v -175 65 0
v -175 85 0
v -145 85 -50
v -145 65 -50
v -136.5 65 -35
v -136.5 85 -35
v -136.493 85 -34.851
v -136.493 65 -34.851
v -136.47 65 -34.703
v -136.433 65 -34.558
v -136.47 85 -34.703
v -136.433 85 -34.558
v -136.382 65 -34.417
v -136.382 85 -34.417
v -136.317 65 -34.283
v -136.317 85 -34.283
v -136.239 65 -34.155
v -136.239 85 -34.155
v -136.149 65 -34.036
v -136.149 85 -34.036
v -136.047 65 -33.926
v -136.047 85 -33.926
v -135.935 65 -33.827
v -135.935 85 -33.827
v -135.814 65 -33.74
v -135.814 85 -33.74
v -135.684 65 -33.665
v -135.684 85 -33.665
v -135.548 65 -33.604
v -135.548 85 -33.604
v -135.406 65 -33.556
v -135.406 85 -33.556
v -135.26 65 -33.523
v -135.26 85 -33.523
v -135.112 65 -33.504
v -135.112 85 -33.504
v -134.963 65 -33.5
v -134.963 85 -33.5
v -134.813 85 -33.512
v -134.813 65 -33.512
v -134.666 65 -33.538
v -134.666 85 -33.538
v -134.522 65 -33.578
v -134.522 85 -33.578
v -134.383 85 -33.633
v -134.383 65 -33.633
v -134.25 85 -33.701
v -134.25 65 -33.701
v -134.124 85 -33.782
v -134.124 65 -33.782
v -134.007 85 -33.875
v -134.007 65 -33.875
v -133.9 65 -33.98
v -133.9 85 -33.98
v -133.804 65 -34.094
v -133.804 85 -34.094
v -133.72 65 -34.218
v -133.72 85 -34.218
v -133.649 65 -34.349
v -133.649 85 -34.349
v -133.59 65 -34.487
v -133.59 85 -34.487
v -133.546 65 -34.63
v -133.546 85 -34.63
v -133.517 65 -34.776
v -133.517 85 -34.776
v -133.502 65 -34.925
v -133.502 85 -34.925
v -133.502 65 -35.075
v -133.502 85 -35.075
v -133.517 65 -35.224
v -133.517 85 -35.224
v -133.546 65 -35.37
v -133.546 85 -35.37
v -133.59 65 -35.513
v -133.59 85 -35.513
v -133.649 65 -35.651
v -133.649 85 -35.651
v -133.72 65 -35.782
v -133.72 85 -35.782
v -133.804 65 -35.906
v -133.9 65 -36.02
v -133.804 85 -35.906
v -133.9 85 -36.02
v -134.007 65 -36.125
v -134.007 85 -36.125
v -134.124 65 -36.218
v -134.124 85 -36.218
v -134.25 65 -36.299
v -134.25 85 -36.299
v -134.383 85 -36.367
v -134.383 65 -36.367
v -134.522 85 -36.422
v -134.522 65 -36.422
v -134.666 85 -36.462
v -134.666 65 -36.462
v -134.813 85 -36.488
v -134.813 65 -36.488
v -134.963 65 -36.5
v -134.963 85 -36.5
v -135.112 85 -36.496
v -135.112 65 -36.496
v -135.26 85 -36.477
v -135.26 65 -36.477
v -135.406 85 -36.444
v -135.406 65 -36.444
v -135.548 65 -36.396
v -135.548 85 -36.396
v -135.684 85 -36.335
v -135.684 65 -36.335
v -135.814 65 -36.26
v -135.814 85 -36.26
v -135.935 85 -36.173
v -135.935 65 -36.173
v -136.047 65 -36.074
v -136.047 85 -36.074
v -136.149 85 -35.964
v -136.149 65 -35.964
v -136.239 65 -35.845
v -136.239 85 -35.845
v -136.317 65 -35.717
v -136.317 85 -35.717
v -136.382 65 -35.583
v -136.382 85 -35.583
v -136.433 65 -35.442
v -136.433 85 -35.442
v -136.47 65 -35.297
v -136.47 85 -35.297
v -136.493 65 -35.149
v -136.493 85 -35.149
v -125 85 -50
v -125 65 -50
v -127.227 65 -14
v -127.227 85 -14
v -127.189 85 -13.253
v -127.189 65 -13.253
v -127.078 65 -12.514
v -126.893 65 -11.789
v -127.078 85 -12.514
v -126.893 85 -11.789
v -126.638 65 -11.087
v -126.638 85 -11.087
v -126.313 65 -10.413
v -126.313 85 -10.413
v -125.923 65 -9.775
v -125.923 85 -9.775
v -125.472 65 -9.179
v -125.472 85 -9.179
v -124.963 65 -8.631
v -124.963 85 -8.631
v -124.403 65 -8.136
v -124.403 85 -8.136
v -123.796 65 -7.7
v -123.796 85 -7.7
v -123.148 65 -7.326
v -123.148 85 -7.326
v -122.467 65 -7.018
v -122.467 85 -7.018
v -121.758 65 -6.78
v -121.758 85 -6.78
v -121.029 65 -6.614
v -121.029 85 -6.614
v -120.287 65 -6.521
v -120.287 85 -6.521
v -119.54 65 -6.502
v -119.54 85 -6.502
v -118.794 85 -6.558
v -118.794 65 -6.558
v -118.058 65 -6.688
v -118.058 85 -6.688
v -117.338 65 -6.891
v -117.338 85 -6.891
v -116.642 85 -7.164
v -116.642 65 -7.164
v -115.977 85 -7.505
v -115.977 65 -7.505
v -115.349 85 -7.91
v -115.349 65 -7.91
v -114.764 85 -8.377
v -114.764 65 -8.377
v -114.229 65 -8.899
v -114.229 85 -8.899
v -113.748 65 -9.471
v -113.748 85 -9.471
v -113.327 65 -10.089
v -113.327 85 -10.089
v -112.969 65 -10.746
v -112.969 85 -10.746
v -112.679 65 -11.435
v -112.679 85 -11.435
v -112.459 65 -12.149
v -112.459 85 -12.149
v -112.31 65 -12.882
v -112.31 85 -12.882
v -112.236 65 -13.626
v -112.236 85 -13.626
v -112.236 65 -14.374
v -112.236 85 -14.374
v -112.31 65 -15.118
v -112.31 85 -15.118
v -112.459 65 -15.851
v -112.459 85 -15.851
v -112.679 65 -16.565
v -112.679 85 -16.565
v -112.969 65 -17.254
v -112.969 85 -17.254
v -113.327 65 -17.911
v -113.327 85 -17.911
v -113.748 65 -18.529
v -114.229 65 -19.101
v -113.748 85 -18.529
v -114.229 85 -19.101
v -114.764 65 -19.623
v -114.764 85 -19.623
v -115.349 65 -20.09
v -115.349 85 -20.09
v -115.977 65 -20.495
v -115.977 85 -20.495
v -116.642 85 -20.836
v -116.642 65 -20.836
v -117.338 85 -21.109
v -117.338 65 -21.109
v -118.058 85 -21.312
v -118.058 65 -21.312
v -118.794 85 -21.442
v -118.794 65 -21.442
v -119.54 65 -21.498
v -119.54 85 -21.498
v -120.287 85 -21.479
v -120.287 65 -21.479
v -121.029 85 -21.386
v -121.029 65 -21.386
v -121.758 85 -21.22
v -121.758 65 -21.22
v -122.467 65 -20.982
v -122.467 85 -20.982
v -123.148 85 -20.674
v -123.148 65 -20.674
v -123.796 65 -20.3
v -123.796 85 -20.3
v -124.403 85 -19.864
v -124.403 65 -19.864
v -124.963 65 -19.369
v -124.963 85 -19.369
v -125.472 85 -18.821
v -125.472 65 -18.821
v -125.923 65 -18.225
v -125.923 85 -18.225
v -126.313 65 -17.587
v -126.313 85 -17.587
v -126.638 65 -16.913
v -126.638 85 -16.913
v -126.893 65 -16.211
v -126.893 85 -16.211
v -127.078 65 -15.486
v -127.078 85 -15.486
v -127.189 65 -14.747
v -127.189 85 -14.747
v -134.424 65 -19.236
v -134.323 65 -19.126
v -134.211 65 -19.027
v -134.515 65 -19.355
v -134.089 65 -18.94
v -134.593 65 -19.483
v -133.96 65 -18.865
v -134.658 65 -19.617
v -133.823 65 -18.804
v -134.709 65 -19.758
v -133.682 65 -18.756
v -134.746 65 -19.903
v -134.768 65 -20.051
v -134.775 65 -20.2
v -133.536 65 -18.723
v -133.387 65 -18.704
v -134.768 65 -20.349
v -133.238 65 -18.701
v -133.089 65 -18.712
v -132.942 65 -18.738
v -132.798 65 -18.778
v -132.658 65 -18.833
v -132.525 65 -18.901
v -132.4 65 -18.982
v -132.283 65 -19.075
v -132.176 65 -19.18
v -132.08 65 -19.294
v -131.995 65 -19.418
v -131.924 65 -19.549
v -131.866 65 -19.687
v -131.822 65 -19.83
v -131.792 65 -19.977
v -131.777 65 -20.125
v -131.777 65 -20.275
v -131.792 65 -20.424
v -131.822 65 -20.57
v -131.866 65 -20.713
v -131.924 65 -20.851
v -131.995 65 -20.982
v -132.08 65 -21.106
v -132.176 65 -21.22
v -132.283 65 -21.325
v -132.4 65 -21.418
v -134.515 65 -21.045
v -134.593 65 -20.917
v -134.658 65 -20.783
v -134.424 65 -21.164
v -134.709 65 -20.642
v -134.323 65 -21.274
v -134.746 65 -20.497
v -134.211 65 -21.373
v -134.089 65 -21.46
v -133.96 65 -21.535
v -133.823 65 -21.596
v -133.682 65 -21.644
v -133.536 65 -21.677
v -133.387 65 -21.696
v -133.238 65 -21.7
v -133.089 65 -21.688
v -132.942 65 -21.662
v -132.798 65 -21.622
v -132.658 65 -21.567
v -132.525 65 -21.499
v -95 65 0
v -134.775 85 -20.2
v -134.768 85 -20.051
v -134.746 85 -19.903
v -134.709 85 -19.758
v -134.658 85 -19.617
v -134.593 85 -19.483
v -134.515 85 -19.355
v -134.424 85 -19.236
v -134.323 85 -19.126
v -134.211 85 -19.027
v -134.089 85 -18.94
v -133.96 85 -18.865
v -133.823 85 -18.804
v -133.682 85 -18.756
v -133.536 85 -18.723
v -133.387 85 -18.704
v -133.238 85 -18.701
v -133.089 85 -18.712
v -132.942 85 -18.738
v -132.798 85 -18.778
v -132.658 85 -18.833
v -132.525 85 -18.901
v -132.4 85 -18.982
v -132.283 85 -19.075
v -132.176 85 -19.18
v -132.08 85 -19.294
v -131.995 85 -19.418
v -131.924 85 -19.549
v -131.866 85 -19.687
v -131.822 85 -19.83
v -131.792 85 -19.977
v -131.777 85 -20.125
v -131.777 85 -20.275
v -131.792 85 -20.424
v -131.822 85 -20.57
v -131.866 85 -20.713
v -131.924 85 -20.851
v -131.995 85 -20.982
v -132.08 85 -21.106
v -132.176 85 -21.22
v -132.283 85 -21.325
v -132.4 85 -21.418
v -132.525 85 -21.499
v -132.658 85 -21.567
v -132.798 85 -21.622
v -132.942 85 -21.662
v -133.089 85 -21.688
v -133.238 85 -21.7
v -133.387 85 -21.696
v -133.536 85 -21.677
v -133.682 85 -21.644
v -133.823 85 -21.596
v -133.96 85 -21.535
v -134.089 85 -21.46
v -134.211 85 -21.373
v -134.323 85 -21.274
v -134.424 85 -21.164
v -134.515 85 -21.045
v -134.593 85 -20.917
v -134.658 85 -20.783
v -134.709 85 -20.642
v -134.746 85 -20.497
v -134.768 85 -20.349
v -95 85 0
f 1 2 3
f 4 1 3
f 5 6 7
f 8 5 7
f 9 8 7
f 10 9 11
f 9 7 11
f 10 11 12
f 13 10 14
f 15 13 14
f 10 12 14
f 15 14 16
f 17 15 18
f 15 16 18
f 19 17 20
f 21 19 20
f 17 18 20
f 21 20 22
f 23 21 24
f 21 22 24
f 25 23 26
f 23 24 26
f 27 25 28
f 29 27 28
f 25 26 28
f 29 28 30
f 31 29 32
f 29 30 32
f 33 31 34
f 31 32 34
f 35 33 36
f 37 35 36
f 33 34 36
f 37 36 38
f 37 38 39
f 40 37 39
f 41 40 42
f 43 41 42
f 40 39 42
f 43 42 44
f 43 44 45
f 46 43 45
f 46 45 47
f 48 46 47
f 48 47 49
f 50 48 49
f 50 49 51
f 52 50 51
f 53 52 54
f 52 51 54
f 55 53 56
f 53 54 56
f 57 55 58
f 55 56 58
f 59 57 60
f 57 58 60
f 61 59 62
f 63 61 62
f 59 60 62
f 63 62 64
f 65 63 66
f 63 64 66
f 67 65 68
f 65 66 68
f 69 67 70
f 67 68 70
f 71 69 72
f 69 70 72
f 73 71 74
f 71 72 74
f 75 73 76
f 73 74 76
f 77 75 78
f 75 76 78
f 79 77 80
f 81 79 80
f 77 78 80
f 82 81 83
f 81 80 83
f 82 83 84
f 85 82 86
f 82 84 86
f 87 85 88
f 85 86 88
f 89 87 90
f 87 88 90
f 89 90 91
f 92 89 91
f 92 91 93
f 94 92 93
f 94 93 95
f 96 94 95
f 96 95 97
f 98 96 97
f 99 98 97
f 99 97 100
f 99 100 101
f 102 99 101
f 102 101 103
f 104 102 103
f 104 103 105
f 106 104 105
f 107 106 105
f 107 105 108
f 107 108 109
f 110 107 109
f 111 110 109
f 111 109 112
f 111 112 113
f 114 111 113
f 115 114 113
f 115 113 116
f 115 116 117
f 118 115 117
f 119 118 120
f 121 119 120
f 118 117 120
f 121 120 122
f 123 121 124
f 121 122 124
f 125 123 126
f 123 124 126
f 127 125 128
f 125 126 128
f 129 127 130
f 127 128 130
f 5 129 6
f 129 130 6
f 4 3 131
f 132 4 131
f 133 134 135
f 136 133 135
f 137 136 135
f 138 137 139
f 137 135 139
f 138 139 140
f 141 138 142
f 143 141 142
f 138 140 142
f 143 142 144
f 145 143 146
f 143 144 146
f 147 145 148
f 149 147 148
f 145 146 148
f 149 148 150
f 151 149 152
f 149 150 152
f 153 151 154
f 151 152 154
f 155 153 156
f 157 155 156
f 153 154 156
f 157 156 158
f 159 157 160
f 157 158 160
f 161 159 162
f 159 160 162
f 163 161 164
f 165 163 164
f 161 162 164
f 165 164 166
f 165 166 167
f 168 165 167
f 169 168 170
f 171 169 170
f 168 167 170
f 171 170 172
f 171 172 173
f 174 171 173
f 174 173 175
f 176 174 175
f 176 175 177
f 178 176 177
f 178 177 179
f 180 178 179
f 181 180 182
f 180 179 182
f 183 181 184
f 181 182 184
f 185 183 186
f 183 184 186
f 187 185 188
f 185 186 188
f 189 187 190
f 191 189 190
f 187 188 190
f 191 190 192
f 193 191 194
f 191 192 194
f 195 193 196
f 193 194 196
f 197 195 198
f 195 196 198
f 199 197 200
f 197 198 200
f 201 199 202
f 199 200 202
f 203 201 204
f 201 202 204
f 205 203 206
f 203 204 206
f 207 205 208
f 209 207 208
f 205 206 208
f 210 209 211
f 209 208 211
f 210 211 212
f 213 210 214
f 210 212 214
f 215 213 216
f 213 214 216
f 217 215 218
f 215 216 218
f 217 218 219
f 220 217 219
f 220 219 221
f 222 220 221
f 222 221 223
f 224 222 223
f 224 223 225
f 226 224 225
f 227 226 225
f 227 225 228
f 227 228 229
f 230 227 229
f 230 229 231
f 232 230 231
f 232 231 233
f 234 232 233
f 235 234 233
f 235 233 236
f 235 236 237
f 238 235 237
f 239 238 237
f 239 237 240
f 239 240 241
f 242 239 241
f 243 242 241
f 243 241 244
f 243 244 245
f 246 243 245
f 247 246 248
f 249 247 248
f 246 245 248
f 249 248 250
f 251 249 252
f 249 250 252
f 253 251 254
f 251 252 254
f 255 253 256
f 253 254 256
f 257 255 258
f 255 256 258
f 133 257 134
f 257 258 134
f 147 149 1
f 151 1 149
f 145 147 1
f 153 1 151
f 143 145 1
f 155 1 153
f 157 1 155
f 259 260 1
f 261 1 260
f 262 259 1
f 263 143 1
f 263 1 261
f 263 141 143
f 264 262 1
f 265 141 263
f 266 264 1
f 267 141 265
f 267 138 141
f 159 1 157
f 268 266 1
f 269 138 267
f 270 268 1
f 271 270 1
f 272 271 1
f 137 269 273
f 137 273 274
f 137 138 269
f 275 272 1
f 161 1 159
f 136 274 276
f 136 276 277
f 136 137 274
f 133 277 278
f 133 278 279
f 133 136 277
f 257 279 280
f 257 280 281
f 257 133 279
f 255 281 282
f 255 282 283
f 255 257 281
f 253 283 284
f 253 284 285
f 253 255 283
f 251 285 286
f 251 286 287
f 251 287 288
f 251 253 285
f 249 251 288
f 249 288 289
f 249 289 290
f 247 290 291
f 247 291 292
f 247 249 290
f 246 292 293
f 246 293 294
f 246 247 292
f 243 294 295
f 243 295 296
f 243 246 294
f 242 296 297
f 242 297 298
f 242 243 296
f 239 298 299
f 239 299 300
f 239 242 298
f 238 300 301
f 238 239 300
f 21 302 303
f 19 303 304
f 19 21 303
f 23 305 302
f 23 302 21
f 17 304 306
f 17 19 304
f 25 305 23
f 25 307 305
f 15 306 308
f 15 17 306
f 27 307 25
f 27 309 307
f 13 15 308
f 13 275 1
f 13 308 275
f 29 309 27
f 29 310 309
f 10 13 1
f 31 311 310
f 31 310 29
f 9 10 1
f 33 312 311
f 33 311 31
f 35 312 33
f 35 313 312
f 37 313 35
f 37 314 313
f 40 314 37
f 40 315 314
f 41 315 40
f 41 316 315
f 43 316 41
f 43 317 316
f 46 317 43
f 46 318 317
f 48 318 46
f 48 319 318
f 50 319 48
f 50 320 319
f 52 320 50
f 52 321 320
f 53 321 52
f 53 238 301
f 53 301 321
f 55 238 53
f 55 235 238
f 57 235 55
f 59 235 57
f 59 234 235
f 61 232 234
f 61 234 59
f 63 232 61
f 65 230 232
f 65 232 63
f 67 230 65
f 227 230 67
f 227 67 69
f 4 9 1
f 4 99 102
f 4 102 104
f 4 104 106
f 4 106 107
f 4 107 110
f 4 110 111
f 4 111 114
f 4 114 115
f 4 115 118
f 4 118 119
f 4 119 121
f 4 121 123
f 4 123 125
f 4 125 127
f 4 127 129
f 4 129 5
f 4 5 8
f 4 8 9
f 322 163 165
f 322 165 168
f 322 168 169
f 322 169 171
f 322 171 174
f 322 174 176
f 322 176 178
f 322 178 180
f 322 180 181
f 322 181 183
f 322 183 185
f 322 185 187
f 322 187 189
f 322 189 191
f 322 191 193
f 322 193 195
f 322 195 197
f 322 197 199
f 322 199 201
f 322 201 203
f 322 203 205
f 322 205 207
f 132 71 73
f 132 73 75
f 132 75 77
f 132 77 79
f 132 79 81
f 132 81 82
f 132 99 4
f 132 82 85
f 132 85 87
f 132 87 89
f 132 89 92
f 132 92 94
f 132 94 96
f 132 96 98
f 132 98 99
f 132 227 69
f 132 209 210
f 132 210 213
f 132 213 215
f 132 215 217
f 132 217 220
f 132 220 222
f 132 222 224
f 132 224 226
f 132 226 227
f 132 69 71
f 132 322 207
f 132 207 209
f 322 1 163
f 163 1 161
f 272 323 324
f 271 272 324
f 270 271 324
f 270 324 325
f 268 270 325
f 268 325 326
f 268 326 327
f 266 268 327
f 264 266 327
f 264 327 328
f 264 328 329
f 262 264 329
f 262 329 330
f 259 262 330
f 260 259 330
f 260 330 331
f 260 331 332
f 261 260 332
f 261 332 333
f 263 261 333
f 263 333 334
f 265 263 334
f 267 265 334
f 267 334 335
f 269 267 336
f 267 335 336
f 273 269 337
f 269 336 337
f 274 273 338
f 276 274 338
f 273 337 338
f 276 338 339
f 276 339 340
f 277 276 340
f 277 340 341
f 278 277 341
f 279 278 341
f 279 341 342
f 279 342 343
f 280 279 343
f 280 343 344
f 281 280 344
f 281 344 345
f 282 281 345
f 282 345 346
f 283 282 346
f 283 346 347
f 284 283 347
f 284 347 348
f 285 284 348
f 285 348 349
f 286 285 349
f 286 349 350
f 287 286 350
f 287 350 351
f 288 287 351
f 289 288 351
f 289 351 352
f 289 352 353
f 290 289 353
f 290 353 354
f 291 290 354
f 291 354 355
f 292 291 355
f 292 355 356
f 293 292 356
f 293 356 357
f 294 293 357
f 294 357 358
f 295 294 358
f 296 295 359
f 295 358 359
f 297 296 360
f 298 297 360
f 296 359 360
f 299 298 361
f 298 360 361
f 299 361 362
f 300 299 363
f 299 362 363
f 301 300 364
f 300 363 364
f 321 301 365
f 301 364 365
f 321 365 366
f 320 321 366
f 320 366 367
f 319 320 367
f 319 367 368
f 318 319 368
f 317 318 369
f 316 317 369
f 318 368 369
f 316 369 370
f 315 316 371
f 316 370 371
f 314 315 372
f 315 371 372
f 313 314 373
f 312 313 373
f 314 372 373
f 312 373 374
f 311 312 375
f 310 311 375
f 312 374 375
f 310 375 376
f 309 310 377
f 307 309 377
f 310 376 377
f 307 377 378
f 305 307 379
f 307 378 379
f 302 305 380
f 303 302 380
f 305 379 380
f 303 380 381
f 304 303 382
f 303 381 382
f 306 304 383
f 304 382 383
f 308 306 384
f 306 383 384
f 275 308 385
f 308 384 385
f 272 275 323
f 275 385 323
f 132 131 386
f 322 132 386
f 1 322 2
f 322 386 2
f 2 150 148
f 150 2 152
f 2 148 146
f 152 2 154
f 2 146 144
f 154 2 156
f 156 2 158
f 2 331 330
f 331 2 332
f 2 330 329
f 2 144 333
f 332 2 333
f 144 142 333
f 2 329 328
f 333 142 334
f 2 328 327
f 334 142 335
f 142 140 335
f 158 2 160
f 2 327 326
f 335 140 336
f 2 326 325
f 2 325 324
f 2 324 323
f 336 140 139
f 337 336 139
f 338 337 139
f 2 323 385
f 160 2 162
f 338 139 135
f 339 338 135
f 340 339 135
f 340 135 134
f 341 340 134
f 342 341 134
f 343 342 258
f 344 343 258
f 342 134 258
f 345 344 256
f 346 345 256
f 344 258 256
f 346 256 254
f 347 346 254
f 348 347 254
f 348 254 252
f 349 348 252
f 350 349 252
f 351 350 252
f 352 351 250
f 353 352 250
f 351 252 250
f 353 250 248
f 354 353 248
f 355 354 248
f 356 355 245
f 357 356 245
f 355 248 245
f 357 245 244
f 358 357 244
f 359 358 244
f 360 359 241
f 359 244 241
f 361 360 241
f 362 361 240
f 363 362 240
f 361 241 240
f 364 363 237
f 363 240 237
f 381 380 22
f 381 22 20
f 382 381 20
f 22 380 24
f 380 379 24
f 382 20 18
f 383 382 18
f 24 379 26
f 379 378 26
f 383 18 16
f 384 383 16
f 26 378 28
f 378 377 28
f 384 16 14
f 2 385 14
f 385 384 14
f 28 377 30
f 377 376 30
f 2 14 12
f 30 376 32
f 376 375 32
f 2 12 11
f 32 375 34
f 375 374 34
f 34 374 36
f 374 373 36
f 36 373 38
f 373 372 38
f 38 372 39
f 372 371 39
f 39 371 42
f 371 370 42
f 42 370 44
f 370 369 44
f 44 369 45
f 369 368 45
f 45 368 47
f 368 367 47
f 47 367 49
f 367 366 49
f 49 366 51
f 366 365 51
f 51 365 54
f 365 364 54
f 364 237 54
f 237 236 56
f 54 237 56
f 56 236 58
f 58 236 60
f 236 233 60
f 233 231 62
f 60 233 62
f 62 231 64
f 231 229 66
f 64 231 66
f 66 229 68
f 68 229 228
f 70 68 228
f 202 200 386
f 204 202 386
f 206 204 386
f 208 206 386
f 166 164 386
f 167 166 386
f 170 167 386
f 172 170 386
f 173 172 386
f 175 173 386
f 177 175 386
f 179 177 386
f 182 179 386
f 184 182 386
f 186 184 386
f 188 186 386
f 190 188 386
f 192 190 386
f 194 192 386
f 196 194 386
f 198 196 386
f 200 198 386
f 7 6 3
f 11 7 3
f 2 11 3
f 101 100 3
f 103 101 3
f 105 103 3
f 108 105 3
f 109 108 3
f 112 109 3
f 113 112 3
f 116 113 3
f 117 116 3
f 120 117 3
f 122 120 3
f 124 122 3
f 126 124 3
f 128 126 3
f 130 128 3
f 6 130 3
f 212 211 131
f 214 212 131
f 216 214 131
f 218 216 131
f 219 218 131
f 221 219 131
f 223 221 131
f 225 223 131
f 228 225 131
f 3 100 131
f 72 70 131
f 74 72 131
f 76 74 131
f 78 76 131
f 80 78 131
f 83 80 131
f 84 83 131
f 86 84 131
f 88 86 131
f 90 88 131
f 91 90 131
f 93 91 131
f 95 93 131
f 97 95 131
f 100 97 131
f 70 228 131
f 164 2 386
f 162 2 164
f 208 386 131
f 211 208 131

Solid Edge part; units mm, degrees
sketch "Sketch1" plane through (0, 85, 0) normal (0, 1, 0) x (-1, 0, 0)
  line L0 (175, 0) -> (145, -50)
  line L1 (145, -50) -> (125, -50)
  line L2 (125, -50) -> (95, 0)
  line L3 (95, 0) -> (175, 0)
  circle A0 centre (119.7267, -14) radius 7.5
  circle A1 centre (133.2754, -20.2001) radius 1.5
  circle A2 centre (135, -35) radius 1.5
extrude "Extrusionsausprägung_1" add sketch "Sketch1" against normal blind 20
properties material "(None)"
